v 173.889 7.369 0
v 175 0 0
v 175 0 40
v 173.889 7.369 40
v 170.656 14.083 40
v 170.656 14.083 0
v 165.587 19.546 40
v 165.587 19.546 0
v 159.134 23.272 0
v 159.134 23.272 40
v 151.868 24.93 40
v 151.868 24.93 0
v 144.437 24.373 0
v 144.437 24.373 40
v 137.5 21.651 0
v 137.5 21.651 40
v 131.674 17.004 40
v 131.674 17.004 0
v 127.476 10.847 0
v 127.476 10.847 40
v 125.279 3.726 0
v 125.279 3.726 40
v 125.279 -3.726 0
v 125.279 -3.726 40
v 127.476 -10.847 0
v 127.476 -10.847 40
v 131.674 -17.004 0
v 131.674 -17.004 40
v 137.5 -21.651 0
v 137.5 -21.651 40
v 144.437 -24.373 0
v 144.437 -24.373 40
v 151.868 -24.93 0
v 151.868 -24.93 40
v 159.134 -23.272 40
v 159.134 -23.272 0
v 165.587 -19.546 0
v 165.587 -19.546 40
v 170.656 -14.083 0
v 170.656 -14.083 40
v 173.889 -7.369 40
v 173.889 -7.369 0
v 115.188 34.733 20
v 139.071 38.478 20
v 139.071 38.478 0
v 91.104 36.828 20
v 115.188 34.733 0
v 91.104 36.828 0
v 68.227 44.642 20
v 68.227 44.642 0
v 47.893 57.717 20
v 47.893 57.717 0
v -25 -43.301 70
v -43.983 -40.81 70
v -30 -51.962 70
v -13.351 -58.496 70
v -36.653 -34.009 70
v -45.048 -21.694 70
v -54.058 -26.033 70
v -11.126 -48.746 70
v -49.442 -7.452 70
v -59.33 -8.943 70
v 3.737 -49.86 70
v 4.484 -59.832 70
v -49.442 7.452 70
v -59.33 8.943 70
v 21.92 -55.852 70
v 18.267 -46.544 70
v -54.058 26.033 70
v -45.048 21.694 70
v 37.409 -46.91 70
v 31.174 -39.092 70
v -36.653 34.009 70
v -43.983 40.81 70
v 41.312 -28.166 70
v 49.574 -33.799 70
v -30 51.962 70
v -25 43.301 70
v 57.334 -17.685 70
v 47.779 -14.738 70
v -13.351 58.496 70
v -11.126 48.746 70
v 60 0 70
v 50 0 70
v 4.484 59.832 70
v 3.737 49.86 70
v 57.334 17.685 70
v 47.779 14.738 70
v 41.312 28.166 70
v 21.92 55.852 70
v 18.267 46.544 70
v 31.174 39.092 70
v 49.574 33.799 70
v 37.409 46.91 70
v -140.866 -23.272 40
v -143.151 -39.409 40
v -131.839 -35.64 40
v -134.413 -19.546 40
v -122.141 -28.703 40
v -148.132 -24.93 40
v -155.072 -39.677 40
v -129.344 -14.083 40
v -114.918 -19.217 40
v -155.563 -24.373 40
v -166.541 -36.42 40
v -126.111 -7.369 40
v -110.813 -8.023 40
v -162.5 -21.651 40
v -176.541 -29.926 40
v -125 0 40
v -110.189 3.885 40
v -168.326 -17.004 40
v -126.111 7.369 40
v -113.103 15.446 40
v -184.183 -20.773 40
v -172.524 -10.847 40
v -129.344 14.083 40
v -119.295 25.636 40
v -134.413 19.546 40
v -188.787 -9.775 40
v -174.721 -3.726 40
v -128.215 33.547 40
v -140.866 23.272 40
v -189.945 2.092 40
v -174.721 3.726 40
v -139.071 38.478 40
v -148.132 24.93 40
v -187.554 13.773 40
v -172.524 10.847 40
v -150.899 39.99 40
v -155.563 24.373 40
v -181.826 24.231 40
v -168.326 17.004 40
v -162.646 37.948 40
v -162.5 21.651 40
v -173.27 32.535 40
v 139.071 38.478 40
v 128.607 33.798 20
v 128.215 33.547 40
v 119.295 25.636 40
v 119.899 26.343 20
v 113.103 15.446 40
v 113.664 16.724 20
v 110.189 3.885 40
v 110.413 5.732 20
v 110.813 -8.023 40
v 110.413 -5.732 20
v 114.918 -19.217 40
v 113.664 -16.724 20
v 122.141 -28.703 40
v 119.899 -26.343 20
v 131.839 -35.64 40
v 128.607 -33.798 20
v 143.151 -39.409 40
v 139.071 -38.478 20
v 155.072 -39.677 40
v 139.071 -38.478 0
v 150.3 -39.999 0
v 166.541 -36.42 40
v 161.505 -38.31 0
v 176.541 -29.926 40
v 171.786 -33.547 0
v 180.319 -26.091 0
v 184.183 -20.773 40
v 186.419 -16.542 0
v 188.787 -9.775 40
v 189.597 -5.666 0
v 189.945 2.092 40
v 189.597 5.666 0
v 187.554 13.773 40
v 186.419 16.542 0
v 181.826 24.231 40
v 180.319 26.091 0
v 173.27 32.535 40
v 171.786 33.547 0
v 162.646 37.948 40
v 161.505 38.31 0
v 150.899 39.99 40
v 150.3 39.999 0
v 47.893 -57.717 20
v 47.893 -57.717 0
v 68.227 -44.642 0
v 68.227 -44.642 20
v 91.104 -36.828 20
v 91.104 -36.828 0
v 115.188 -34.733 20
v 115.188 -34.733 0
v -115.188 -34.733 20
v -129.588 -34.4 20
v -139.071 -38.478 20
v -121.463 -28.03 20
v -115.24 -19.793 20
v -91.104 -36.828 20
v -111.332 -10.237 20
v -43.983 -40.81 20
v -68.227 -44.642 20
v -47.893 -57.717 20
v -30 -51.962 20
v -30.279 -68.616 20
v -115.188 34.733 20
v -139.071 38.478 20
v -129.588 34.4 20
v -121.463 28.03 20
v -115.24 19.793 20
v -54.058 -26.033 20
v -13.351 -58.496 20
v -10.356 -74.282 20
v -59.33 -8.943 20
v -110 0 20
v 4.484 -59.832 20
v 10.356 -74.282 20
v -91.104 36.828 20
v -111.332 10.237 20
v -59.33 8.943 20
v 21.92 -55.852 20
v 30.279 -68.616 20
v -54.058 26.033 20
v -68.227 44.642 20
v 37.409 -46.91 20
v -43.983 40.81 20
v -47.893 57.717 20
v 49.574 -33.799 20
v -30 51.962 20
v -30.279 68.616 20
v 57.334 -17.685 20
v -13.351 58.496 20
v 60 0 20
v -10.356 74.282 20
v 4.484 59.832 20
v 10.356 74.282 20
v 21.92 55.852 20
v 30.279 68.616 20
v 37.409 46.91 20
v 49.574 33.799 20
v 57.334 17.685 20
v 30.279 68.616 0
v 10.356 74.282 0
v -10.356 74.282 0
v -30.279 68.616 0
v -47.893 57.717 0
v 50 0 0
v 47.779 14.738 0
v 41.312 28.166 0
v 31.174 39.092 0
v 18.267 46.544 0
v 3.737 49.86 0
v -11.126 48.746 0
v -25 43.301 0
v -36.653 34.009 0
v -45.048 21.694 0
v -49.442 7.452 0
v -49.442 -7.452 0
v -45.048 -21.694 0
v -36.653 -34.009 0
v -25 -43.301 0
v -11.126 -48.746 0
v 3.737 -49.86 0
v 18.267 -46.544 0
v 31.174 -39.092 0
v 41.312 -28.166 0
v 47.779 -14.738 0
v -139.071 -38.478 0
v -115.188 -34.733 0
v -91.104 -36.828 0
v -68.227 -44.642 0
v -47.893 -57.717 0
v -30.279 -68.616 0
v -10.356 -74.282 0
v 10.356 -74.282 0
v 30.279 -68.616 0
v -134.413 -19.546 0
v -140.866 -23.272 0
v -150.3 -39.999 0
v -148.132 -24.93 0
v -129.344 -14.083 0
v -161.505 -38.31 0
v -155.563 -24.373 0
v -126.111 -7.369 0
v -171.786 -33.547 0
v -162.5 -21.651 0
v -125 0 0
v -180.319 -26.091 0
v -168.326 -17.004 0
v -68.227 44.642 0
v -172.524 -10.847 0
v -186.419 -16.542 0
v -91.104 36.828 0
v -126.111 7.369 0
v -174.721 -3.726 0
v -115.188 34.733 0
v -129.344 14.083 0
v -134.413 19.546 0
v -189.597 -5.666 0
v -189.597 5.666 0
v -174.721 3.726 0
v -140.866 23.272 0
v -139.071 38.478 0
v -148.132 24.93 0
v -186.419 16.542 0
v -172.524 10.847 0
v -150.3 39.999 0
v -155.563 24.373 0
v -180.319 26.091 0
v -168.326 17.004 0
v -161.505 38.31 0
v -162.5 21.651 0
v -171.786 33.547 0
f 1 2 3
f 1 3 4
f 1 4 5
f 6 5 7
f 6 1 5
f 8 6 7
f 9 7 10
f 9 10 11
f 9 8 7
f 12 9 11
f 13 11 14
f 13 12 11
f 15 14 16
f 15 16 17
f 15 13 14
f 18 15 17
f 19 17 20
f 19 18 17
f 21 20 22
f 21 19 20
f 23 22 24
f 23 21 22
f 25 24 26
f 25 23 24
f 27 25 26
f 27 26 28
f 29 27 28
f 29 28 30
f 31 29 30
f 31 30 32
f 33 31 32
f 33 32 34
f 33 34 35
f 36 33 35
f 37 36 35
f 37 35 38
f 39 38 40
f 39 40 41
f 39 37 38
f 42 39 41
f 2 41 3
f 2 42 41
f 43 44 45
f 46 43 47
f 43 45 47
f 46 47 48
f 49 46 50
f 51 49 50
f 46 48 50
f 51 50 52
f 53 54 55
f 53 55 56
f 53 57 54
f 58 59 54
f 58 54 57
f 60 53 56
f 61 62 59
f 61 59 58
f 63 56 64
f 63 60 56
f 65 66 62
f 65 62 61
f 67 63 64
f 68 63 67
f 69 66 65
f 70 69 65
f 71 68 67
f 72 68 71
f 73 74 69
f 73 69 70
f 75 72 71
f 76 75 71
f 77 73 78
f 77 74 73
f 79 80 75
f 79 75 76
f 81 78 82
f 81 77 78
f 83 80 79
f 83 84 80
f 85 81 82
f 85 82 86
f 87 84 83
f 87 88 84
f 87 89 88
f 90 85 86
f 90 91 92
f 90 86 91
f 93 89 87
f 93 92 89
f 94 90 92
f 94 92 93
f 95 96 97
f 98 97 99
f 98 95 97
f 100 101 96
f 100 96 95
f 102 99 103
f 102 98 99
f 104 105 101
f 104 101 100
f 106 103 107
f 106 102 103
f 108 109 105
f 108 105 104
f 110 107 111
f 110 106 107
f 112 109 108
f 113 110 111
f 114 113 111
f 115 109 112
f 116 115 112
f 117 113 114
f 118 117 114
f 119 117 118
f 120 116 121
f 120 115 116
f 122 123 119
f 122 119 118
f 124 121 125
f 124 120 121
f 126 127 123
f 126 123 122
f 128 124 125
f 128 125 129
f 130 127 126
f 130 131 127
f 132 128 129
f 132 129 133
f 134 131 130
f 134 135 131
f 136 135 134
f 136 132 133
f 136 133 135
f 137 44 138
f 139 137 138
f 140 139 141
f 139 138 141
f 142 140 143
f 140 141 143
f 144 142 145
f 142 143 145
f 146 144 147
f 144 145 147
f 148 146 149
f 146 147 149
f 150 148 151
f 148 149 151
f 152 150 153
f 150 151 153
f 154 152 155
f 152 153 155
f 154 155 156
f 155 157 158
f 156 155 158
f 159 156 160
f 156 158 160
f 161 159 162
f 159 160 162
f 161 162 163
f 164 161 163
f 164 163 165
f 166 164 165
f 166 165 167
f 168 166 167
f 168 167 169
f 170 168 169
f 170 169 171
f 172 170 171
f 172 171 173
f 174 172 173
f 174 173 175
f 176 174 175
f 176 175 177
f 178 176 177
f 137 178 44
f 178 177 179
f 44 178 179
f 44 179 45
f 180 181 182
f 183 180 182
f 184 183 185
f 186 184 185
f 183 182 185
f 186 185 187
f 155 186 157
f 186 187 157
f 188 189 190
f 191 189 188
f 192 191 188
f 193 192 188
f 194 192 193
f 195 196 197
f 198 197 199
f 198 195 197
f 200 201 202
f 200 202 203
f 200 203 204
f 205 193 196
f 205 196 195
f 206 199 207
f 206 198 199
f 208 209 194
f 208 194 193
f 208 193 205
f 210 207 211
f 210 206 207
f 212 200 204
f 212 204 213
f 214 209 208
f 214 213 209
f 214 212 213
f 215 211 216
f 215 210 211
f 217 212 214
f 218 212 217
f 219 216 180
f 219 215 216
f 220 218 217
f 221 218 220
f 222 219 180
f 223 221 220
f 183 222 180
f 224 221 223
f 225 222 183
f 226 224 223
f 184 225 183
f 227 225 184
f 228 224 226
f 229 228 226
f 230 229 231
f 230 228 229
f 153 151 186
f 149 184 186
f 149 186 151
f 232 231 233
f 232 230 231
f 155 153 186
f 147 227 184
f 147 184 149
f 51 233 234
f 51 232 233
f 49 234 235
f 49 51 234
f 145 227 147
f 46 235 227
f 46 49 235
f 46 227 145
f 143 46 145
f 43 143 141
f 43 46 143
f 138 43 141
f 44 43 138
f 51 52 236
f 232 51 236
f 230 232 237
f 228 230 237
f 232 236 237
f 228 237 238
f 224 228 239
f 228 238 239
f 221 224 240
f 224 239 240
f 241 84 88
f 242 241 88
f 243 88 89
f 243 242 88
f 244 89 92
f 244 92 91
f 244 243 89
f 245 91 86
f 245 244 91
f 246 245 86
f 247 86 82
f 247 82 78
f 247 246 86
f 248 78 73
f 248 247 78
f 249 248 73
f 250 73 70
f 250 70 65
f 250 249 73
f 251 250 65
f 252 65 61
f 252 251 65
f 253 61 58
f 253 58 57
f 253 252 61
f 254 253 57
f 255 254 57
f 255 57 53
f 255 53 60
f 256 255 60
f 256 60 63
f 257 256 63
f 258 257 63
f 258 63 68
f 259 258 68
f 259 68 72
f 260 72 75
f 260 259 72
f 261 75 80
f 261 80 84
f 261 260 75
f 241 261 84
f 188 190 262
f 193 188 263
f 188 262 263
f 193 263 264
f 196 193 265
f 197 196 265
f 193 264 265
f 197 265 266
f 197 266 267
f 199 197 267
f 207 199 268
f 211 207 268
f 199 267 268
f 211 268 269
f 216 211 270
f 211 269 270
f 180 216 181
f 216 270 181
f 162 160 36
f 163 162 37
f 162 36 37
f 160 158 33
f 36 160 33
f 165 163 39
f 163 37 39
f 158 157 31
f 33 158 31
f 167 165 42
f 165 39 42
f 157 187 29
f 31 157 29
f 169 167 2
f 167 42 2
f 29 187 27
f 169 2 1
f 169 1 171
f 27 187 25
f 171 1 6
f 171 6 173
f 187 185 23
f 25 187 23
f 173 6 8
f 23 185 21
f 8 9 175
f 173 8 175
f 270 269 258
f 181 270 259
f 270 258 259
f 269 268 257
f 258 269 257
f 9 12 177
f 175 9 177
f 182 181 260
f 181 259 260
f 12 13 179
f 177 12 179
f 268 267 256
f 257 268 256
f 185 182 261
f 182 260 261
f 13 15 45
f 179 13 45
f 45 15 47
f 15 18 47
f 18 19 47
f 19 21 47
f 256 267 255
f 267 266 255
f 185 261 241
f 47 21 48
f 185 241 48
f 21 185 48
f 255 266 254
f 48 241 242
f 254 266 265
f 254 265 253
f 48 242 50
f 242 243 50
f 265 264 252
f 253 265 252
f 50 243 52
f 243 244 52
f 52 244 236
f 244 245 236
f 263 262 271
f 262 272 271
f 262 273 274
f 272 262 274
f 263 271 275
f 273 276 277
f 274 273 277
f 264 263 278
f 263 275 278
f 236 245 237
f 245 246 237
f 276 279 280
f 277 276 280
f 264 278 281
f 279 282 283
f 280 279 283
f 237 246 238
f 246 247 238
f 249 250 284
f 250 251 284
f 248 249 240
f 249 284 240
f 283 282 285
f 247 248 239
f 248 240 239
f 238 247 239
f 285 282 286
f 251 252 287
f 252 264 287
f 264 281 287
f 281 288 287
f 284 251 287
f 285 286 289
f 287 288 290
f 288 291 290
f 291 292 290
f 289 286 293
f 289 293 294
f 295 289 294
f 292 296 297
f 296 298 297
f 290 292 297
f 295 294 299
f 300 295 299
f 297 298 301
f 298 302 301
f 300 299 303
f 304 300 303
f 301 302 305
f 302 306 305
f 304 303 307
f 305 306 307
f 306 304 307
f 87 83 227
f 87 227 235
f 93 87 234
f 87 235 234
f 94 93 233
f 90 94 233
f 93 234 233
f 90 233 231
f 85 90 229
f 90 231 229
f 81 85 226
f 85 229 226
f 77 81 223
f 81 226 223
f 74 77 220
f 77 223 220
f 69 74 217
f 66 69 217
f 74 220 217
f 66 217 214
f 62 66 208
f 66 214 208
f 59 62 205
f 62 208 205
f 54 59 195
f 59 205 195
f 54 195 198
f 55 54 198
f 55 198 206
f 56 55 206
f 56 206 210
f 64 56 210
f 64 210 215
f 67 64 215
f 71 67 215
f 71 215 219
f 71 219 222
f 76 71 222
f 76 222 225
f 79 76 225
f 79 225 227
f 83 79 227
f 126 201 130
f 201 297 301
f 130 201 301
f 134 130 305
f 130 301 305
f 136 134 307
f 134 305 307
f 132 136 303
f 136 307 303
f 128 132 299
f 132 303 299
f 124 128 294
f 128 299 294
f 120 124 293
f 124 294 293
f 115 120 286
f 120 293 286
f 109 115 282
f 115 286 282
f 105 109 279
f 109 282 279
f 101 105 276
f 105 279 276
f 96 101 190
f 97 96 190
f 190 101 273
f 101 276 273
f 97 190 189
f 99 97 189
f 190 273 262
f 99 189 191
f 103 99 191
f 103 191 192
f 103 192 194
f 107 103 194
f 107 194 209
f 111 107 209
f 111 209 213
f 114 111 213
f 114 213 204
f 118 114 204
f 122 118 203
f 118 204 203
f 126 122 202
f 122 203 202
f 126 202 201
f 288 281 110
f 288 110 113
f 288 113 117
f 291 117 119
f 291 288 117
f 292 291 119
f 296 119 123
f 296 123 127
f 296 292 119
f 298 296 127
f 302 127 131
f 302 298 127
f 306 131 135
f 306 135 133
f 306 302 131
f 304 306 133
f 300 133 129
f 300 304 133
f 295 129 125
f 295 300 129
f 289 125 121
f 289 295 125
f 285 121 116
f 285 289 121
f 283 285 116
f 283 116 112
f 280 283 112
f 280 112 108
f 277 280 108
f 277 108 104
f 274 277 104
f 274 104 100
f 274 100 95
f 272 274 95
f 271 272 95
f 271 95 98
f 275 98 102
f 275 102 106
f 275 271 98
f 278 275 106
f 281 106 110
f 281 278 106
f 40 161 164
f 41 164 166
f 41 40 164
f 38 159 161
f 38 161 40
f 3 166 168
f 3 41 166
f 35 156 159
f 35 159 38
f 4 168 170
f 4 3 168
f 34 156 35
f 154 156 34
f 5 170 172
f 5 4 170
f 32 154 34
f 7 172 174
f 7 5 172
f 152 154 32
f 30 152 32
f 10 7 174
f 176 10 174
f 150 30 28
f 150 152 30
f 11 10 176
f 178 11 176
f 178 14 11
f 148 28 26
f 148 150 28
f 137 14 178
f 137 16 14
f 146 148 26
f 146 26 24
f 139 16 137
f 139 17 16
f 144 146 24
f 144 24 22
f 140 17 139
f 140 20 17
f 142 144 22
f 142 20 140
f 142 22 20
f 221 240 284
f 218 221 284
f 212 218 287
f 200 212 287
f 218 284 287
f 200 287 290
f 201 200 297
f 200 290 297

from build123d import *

# Parameters (mm, degrees)
SKETCH2_R           = 60
BOSS_EXTRUDE1_DEPTH = 20
SKETCH2_5_R         = 40
SKETCH2_5_R_2       = 25
BOSS_EXTRUDE4_DEPTH = 40
SKETCH2_6_R         = 60
SKETCH2_6_R_2       = 50
BOSS_EXTRUDE5_DEPTH = 70


with BuildPart() as part:
    # Sketch2 → Boss-Extrude1 (new body)
    with BuildSketch(Plane.XY):
        with BuildLine():
            ThreePointArc((-139.071428571, -38.478127898), (-91.104177178, -36.827906099), (-47.892857143, -57.717191847))
            ThreePointArc((-47.892857143, -57.717191847), (0, -75), (47.892857143, -57.717191847))
            ThreePointArc((47.892857143, -57.717191847), (91.104177178, -36.827906099), (139.071428571, -38.478127898))
            ThreePointArc((139.071428571, -38.478127898), (110, 0), (139.071428571, 38.478127898))
            ThreePointArc((139.071428571, 38.478127898), (91.104177178, 36.827906099), (47.892857143, 57.717191847))
            ThreePointArc((47.892857143, 57.717191847), (0, 75), (-47.892857143, 57.717191847))
            ThreePointArc((-47.892857143, 57.717191847), (-91.104177178, 36.827906099), (-139.071428571, 38.478127898))
            ThreePointArc((-139.071428571, 38.478127898), (-118.084934144, 24.112830017), (-110, 0))
            ThreePointArc((-110, 0), (-118.084934144, -24.112830017), (-139.071428571, -38.478127898))
        make_face()
        Circle(SKETCH2_R, mode=Mode.SUBTRACT)
    extrude(amount=BOSS_EXTRUDE1_DEPTH)

    # Sketch2<5> → Boss-Extrude4 (add)
    # profile 1 of 2: a face of its own
    with BuildSketch(Plane.XY):
        with Locations((-150, 0)):
            Circle(SKETCH2_5_R)
        with Locations((-150, 0)):
            Circle(SKETCH2_5_R_2, mode=Mode.SUBTRACT)
    # profile 2 of 2: a face of its own
    with BuildSketch(Plane.XY):
        with Locations((150, 0)):
            Circle(SKETCH2_5_R)
        with Locations((150, 0)):
            Circle(SKETCH2_5_R_2, mode=Mode.SUBTRACT)
    extrude(amount=BOSS_EXTRUDE4_DEPTH)

    # Sketch2<6> → Boss-Extrude5 (add)
    with BuildSketch(Plane.XY):
        Circle(SKETCH2_6_R)
        Circle(SKETCH2_6_R_2, mode=Mode.SUBTRACT)
    extrude(amount=BOSS_EXTRUDE5_DEPTH)


solid = part.part
